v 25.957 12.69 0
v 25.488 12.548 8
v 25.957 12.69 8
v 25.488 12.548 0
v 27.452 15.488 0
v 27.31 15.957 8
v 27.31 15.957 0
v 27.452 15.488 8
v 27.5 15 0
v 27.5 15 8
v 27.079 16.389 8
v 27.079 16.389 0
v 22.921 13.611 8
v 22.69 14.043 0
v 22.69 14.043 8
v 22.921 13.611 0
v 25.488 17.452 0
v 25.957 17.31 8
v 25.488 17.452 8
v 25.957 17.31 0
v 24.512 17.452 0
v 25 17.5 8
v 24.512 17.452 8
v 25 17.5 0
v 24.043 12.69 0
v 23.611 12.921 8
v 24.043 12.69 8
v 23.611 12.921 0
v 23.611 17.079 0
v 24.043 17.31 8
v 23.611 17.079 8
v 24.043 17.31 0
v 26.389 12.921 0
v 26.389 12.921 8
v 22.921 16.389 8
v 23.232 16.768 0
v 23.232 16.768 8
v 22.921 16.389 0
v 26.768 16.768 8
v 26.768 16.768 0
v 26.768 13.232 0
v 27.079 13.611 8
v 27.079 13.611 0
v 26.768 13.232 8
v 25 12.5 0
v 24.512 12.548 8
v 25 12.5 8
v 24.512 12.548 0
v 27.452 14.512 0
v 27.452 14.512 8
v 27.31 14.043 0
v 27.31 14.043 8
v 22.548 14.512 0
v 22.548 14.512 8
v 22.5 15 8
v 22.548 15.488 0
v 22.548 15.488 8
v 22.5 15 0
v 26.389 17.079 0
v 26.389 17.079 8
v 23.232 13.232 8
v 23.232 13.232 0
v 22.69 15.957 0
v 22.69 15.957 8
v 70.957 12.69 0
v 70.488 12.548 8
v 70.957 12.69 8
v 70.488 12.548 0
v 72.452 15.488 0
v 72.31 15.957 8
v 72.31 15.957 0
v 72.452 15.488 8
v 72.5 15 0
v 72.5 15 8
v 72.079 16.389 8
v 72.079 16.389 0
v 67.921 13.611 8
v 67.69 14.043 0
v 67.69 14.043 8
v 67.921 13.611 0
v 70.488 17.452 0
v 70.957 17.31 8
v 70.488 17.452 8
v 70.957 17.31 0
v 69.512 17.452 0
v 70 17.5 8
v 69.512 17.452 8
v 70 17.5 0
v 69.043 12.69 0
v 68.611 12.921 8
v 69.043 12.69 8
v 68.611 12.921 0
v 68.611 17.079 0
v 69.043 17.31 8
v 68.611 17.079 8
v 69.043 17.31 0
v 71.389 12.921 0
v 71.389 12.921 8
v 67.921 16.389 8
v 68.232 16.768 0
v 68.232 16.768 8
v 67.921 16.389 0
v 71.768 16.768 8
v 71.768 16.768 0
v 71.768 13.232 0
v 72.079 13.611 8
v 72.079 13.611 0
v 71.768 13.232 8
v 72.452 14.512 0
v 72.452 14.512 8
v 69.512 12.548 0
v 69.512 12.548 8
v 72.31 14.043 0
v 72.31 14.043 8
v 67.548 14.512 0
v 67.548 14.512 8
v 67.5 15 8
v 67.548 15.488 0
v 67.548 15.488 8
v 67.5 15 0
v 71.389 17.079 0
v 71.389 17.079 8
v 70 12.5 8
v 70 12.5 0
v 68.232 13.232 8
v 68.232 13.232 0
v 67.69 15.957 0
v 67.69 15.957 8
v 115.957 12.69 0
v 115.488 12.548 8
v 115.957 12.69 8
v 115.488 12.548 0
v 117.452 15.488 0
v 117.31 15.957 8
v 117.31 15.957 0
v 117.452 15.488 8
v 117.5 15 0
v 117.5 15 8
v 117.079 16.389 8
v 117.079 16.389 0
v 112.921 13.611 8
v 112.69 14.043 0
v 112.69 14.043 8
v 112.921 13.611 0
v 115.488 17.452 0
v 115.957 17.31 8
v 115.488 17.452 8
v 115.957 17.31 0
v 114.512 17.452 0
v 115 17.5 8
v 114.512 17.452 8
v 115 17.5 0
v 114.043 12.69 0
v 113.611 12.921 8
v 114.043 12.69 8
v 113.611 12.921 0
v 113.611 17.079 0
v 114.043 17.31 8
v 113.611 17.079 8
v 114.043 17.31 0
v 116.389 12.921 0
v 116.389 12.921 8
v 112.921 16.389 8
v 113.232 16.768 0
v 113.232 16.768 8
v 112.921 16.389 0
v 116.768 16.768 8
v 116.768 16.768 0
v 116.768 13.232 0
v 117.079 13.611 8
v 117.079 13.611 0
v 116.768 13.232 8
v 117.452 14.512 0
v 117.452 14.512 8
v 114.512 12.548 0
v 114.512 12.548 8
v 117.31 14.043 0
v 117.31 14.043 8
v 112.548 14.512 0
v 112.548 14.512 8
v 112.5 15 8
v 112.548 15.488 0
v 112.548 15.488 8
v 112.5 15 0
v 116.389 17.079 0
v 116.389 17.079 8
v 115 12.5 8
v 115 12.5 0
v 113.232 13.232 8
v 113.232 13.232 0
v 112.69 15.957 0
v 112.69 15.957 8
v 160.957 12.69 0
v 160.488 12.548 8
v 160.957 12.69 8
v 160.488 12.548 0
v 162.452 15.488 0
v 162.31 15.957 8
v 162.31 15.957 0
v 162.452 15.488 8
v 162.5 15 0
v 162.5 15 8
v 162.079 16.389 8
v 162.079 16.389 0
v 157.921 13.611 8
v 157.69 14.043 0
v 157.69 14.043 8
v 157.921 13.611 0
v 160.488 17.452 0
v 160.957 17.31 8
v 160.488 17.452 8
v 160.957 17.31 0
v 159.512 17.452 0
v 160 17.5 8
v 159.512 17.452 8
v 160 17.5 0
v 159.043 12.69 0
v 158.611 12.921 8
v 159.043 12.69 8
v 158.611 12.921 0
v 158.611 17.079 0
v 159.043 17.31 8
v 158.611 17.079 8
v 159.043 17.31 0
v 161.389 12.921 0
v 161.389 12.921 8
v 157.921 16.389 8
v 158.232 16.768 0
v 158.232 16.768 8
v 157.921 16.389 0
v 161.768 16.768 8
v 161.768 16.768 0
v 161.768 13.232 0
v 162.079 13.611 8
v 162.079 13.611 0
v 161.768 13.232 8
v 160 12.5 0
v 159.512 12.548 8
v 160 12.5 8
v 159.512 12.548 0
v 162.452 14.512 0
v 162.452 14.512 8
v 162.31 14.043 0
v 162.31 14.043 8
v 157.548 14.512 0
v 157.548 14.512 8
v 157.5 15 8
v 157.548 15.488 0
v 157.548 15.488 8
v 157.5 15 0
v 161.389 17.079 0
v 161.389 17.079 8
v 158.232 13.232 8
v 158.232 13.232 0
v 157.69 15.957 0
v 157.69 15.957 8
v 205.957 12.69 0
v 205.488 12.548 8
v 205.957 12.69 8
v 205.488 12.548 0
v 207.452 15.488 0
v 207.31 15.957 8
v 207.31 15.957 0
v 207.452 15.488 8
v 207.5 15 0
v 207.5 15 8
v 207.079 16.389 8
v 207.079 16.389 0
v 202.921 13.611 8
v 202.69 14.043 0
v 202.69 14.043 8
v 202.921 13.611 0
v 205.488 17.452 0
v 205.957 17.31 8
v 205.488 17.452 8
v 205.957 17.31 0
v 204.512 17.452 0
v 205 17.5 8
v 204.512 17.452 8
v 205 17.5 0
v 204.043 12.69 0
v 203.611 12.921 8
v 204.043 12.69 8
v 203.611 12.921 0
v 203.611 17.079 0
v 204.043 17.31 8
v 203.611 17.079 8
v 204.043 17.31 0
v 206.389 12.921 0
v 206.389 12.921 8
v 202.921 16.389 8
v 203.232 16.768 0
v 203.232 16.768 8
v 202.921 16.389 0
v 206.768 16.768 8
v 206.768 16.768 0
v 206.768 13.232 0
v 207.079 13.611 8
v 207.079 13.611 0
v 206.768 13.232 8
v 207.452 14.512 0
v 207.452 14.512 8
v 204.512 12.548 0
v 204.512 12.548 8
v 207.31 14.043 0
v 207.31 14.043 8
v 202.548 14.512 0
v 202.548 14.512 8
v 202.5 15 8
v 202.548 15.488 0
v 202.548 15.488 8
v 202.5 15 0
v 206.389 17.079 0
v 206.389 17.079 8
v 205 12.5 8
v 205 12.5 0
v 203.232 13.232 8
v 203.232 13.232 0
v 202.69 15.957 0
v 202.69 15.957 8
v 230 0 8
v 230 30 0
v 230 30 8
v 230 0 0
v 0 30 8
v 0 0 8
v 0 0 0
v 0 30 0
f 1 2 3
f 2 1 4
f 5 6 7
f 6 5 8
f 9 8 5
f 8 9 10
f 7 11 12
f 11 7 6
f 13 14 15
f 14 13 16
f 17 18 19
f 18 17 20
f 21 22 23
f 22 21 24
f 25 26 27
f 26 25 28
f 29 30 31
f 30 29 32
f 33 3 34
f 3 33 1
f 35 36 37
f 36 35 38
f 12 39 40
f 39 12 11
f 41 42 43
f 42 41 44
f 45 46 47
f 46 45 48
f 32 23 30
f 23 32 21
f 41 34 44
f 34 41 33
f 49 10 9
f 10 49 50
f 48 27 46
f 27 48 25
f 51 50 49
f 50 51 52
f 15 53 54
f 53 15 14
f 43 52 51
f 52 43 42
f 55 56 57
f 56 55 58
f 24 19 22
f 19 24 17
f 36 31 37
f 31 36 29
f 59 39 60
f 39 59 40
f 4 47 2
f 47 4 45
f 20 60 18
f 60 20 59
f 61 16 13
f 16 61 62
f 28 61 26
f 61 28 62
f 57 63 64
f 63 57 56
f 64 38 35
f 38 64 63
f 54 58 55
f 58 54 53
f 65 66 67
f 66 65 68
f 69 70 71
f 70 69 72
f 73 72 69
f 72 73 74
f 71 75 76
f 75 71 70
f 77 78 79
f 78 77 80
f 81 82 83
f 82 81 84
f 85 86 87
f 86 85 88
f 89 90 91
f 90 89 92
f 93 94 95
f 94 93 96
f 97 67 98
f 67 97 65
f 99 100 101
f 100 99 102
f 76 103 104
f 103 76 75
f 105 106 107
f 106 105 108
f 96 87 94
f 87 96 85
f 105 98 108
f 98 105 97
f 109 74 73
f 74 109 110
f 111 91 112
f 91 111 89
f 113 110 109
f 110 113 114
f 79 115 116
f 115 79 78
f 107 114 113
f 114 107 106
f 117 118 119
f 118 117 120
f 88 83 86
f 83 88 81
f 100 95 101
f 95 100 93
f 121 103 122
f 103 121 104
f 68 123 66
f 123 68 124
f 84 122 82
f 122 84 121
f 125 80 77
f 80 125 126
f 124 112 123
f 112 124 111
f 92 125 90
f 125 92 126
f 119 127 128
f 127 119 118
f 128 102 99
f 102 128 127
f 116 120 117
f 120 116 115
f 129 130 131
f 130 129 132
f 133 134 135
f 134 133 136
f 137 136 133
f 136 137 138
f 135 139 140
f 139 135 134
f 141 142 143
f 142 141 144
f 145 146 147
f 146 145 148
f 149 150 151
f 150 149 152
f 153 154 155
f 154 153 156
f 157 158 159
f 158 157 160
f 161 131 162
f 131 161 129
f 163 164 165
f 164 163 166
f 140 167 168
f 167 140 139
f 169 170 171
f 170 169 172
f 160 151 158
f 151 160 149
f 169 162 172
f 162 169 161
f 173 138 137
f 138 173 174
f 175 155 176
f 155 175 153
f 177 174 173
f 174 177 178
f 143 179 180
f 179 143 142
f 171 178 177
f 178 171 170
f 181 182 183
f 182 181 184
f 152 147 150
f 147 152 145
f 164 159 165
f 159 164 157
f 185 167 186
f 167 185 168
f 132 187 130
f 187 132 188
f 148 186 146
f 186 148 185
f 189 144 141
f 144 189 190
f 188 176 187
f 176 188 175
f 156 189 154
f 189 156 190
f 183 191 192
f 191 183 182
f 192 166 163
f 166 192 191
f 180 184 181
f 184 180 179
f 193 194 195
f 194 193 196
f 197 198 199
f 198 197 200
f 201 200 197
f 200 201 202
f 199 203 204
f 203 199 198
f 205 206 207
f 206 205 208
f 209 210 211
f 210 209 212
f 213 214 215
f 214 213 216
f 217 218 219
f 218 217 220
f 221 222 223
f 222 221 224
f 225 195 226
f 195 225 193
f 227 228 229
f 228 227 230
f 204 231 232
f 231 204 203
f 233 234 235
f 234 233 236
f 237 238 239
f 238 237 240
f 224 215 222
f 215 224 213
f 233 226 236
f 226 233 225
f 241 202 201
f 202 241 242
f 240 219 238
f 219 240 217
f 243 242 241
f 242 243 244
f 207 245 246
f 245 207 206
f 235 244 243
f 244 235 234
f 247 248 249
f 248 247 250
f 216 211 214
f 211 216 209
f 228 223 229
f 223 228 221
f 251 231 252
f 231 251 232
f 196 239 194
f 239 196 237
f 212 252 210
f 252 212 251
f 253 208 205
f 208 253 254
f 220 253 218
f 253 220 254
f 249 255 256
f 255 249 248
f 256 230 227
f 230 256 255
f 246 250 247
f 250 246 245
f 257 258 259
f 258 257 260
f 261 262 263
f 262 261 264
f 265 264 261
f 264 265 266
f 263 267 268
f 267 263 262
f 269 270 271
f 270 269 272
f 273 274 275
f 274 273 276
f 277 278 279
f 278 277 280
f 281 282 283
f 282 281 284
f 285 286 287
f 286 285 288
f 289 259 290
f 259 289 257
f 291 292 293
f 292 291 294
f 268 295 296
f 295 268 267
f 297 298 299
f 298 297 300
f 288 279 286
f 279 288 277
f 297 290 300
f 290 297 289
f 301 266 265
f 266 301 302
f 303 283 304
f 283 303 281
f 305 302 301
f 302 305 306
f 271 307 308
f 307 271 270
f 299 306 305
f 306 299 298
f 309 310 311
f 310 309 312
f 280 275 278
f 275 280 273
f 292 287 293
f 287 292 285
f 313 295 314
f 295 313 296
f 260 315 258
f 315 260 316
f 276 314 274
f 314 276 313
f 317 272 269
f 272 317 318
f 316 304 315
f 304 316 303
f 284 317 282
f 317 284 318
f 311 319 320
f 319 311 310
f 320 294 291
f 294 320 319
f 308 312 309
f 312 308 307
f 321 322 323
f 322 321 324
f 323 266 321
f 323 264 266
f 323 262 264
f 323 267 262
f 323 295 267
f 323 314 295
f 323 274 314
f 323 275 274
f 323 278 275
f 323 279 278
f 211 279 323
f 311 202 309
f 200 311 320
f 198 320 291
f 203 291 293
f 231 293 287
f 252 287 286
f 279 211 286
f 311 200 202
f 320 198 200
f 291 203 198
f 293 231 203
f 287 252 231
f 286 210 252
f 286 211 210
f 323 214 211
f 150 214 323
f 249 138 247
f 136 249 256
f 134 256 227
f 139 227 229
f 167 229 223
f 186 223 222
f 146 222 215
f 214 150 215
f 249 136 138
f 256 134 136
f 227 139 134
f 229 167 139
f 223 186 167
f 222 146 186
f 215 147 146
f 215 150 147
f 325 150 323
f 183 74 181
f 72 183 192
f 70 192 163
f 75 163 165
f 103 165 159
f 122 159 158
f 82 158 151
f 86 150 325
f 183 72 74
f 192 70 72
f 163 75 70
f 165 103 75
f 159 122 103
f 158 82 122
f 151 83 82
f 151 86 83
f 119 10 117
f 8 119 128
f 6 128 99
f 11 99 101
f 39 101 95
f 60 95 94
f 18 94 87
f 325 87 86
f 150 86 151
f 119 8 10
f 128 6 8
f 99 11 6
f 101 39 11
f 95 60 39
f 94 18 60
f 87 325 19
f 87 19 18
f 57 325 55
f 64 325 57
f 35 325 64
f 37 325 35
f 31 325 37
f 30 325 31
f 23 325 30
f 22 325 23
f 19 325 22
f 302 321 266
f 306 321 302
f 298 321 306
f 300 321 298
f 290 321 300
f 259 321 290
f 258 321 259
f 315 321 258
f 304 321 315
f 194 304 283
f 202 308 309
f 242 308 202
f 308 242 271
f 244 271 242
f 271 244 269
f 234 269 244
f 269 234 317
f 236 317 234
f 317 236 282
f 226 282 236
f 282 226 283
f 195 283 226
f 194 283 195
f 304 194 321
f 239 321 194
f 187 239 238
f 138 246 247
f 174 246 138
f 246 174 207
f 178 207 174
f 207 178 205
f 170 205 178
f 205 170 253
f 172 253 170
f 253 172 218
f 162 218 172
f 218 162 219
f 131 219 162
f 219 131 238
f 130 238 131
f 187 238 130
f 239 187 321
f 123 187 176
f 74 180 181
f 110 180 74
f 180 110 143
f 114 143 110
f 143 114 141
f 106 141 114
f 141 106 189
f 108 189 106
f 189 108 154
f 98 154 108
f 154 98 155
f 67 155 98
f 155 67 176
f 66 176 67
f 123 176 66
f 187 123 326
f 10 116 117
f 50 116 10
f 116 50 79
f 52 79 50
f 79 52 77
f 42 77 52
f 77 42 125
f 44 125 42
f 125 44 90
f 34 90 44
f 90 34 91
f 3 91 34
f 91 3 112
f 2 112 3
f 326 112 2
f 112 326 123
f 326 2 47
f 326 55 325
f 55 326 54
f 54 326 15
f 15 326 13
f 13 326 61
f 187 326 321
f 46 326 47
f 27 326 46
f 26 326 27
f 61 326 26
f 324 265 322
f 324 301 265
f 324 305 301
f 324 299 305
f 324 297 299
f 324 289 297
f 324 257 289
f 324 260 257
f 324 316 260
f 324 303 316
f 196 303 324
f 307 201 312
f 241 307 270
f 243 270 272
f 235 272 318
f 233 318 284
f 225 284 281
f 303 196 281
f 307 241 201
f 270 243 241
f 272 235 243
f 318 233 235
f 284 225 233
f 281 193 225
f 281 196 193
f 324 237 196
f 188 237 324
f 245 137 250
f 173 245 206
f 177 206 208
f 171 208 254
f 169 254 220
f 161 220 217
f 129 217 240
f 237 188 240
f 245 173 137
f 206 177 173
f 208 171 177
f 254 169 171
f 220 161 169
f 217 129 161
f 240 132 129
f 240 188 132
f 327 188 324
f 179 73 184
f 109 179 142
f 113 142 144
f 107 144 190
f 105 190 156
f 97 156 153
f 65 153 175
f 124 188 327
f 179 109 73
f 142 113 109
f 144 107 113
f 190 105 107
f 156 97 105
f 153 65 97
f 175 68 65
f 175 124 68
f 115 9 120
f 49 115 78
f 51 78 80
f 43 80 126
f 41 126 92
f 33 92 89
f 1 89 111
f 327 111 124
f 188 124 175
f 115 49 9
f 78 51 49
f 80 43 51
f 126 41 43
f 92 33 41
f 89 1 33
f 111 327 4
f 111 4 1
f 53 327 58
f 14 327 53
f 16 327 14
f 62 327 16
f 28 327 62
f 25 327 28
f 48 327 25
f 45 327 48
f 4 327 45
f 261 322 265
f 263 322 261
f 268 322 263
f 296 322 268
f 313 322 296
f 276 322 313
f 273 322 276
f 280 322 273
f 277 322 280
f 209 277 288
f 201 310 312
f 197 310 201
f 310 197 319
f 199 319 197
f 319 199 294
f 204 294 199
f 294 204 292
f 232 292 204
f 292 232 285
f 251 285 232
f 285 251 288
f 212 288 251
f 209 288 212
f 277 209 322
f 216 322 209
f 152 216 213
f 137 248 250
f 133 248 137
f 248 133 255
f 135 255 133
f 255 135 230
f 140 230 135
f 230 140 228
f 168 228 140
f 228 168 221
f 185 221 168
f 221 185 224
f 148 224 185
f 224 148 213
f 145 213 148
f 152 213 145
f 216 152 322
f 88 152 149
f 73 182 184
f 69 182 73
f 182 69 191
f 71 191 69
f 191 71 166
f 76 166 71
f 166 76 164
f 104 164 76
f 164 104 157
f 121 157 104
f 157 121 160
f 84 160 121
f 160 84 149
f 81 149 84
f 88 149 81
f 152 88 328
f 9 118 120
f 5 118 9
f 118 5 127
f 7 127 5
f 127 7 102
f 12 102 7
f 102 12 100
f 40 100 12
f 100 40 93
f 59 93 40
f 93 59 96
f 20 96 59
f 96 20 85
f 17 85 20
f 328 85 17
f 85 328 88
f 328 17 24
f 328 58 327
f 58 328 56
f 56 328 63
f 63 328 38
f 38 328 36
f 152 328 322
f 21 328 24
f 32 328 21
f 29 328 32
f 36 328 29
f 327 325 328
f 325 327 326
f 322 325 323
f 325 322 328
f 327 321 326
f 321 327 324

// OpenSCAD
$fn = 32;

// ----------------------------------------------------------------------
// Long rail: 200-250 mm mounting rail
// ----------------------------------------------------------------------

// --- parameters (mm) ---
rail_l = 230;             // rail length, X
rail_w = 30;              // rail width, Y
rail_t = 8;               // rail thickness, Z
hole_d = 5;               // mounting hole diameter
hole_start = 25;          // first hole offset from the end
hole_pitch = 45;          // hole pitch
holes = 5;                // number of holes
fit_tol = 0.1;            // tolerance for press fits, mm
free_tol = 0.3;           // tolerance for clearance fits, mm

difference() {
  cube([rail_l, rail_w, rail_t]);
  for (i = [0 : holes - 1])
    translate([hole_start + i * hole_pitch, rail_w / 2, -1])
      cylinder(h = rail_t + 2, d = hole_d);
}
